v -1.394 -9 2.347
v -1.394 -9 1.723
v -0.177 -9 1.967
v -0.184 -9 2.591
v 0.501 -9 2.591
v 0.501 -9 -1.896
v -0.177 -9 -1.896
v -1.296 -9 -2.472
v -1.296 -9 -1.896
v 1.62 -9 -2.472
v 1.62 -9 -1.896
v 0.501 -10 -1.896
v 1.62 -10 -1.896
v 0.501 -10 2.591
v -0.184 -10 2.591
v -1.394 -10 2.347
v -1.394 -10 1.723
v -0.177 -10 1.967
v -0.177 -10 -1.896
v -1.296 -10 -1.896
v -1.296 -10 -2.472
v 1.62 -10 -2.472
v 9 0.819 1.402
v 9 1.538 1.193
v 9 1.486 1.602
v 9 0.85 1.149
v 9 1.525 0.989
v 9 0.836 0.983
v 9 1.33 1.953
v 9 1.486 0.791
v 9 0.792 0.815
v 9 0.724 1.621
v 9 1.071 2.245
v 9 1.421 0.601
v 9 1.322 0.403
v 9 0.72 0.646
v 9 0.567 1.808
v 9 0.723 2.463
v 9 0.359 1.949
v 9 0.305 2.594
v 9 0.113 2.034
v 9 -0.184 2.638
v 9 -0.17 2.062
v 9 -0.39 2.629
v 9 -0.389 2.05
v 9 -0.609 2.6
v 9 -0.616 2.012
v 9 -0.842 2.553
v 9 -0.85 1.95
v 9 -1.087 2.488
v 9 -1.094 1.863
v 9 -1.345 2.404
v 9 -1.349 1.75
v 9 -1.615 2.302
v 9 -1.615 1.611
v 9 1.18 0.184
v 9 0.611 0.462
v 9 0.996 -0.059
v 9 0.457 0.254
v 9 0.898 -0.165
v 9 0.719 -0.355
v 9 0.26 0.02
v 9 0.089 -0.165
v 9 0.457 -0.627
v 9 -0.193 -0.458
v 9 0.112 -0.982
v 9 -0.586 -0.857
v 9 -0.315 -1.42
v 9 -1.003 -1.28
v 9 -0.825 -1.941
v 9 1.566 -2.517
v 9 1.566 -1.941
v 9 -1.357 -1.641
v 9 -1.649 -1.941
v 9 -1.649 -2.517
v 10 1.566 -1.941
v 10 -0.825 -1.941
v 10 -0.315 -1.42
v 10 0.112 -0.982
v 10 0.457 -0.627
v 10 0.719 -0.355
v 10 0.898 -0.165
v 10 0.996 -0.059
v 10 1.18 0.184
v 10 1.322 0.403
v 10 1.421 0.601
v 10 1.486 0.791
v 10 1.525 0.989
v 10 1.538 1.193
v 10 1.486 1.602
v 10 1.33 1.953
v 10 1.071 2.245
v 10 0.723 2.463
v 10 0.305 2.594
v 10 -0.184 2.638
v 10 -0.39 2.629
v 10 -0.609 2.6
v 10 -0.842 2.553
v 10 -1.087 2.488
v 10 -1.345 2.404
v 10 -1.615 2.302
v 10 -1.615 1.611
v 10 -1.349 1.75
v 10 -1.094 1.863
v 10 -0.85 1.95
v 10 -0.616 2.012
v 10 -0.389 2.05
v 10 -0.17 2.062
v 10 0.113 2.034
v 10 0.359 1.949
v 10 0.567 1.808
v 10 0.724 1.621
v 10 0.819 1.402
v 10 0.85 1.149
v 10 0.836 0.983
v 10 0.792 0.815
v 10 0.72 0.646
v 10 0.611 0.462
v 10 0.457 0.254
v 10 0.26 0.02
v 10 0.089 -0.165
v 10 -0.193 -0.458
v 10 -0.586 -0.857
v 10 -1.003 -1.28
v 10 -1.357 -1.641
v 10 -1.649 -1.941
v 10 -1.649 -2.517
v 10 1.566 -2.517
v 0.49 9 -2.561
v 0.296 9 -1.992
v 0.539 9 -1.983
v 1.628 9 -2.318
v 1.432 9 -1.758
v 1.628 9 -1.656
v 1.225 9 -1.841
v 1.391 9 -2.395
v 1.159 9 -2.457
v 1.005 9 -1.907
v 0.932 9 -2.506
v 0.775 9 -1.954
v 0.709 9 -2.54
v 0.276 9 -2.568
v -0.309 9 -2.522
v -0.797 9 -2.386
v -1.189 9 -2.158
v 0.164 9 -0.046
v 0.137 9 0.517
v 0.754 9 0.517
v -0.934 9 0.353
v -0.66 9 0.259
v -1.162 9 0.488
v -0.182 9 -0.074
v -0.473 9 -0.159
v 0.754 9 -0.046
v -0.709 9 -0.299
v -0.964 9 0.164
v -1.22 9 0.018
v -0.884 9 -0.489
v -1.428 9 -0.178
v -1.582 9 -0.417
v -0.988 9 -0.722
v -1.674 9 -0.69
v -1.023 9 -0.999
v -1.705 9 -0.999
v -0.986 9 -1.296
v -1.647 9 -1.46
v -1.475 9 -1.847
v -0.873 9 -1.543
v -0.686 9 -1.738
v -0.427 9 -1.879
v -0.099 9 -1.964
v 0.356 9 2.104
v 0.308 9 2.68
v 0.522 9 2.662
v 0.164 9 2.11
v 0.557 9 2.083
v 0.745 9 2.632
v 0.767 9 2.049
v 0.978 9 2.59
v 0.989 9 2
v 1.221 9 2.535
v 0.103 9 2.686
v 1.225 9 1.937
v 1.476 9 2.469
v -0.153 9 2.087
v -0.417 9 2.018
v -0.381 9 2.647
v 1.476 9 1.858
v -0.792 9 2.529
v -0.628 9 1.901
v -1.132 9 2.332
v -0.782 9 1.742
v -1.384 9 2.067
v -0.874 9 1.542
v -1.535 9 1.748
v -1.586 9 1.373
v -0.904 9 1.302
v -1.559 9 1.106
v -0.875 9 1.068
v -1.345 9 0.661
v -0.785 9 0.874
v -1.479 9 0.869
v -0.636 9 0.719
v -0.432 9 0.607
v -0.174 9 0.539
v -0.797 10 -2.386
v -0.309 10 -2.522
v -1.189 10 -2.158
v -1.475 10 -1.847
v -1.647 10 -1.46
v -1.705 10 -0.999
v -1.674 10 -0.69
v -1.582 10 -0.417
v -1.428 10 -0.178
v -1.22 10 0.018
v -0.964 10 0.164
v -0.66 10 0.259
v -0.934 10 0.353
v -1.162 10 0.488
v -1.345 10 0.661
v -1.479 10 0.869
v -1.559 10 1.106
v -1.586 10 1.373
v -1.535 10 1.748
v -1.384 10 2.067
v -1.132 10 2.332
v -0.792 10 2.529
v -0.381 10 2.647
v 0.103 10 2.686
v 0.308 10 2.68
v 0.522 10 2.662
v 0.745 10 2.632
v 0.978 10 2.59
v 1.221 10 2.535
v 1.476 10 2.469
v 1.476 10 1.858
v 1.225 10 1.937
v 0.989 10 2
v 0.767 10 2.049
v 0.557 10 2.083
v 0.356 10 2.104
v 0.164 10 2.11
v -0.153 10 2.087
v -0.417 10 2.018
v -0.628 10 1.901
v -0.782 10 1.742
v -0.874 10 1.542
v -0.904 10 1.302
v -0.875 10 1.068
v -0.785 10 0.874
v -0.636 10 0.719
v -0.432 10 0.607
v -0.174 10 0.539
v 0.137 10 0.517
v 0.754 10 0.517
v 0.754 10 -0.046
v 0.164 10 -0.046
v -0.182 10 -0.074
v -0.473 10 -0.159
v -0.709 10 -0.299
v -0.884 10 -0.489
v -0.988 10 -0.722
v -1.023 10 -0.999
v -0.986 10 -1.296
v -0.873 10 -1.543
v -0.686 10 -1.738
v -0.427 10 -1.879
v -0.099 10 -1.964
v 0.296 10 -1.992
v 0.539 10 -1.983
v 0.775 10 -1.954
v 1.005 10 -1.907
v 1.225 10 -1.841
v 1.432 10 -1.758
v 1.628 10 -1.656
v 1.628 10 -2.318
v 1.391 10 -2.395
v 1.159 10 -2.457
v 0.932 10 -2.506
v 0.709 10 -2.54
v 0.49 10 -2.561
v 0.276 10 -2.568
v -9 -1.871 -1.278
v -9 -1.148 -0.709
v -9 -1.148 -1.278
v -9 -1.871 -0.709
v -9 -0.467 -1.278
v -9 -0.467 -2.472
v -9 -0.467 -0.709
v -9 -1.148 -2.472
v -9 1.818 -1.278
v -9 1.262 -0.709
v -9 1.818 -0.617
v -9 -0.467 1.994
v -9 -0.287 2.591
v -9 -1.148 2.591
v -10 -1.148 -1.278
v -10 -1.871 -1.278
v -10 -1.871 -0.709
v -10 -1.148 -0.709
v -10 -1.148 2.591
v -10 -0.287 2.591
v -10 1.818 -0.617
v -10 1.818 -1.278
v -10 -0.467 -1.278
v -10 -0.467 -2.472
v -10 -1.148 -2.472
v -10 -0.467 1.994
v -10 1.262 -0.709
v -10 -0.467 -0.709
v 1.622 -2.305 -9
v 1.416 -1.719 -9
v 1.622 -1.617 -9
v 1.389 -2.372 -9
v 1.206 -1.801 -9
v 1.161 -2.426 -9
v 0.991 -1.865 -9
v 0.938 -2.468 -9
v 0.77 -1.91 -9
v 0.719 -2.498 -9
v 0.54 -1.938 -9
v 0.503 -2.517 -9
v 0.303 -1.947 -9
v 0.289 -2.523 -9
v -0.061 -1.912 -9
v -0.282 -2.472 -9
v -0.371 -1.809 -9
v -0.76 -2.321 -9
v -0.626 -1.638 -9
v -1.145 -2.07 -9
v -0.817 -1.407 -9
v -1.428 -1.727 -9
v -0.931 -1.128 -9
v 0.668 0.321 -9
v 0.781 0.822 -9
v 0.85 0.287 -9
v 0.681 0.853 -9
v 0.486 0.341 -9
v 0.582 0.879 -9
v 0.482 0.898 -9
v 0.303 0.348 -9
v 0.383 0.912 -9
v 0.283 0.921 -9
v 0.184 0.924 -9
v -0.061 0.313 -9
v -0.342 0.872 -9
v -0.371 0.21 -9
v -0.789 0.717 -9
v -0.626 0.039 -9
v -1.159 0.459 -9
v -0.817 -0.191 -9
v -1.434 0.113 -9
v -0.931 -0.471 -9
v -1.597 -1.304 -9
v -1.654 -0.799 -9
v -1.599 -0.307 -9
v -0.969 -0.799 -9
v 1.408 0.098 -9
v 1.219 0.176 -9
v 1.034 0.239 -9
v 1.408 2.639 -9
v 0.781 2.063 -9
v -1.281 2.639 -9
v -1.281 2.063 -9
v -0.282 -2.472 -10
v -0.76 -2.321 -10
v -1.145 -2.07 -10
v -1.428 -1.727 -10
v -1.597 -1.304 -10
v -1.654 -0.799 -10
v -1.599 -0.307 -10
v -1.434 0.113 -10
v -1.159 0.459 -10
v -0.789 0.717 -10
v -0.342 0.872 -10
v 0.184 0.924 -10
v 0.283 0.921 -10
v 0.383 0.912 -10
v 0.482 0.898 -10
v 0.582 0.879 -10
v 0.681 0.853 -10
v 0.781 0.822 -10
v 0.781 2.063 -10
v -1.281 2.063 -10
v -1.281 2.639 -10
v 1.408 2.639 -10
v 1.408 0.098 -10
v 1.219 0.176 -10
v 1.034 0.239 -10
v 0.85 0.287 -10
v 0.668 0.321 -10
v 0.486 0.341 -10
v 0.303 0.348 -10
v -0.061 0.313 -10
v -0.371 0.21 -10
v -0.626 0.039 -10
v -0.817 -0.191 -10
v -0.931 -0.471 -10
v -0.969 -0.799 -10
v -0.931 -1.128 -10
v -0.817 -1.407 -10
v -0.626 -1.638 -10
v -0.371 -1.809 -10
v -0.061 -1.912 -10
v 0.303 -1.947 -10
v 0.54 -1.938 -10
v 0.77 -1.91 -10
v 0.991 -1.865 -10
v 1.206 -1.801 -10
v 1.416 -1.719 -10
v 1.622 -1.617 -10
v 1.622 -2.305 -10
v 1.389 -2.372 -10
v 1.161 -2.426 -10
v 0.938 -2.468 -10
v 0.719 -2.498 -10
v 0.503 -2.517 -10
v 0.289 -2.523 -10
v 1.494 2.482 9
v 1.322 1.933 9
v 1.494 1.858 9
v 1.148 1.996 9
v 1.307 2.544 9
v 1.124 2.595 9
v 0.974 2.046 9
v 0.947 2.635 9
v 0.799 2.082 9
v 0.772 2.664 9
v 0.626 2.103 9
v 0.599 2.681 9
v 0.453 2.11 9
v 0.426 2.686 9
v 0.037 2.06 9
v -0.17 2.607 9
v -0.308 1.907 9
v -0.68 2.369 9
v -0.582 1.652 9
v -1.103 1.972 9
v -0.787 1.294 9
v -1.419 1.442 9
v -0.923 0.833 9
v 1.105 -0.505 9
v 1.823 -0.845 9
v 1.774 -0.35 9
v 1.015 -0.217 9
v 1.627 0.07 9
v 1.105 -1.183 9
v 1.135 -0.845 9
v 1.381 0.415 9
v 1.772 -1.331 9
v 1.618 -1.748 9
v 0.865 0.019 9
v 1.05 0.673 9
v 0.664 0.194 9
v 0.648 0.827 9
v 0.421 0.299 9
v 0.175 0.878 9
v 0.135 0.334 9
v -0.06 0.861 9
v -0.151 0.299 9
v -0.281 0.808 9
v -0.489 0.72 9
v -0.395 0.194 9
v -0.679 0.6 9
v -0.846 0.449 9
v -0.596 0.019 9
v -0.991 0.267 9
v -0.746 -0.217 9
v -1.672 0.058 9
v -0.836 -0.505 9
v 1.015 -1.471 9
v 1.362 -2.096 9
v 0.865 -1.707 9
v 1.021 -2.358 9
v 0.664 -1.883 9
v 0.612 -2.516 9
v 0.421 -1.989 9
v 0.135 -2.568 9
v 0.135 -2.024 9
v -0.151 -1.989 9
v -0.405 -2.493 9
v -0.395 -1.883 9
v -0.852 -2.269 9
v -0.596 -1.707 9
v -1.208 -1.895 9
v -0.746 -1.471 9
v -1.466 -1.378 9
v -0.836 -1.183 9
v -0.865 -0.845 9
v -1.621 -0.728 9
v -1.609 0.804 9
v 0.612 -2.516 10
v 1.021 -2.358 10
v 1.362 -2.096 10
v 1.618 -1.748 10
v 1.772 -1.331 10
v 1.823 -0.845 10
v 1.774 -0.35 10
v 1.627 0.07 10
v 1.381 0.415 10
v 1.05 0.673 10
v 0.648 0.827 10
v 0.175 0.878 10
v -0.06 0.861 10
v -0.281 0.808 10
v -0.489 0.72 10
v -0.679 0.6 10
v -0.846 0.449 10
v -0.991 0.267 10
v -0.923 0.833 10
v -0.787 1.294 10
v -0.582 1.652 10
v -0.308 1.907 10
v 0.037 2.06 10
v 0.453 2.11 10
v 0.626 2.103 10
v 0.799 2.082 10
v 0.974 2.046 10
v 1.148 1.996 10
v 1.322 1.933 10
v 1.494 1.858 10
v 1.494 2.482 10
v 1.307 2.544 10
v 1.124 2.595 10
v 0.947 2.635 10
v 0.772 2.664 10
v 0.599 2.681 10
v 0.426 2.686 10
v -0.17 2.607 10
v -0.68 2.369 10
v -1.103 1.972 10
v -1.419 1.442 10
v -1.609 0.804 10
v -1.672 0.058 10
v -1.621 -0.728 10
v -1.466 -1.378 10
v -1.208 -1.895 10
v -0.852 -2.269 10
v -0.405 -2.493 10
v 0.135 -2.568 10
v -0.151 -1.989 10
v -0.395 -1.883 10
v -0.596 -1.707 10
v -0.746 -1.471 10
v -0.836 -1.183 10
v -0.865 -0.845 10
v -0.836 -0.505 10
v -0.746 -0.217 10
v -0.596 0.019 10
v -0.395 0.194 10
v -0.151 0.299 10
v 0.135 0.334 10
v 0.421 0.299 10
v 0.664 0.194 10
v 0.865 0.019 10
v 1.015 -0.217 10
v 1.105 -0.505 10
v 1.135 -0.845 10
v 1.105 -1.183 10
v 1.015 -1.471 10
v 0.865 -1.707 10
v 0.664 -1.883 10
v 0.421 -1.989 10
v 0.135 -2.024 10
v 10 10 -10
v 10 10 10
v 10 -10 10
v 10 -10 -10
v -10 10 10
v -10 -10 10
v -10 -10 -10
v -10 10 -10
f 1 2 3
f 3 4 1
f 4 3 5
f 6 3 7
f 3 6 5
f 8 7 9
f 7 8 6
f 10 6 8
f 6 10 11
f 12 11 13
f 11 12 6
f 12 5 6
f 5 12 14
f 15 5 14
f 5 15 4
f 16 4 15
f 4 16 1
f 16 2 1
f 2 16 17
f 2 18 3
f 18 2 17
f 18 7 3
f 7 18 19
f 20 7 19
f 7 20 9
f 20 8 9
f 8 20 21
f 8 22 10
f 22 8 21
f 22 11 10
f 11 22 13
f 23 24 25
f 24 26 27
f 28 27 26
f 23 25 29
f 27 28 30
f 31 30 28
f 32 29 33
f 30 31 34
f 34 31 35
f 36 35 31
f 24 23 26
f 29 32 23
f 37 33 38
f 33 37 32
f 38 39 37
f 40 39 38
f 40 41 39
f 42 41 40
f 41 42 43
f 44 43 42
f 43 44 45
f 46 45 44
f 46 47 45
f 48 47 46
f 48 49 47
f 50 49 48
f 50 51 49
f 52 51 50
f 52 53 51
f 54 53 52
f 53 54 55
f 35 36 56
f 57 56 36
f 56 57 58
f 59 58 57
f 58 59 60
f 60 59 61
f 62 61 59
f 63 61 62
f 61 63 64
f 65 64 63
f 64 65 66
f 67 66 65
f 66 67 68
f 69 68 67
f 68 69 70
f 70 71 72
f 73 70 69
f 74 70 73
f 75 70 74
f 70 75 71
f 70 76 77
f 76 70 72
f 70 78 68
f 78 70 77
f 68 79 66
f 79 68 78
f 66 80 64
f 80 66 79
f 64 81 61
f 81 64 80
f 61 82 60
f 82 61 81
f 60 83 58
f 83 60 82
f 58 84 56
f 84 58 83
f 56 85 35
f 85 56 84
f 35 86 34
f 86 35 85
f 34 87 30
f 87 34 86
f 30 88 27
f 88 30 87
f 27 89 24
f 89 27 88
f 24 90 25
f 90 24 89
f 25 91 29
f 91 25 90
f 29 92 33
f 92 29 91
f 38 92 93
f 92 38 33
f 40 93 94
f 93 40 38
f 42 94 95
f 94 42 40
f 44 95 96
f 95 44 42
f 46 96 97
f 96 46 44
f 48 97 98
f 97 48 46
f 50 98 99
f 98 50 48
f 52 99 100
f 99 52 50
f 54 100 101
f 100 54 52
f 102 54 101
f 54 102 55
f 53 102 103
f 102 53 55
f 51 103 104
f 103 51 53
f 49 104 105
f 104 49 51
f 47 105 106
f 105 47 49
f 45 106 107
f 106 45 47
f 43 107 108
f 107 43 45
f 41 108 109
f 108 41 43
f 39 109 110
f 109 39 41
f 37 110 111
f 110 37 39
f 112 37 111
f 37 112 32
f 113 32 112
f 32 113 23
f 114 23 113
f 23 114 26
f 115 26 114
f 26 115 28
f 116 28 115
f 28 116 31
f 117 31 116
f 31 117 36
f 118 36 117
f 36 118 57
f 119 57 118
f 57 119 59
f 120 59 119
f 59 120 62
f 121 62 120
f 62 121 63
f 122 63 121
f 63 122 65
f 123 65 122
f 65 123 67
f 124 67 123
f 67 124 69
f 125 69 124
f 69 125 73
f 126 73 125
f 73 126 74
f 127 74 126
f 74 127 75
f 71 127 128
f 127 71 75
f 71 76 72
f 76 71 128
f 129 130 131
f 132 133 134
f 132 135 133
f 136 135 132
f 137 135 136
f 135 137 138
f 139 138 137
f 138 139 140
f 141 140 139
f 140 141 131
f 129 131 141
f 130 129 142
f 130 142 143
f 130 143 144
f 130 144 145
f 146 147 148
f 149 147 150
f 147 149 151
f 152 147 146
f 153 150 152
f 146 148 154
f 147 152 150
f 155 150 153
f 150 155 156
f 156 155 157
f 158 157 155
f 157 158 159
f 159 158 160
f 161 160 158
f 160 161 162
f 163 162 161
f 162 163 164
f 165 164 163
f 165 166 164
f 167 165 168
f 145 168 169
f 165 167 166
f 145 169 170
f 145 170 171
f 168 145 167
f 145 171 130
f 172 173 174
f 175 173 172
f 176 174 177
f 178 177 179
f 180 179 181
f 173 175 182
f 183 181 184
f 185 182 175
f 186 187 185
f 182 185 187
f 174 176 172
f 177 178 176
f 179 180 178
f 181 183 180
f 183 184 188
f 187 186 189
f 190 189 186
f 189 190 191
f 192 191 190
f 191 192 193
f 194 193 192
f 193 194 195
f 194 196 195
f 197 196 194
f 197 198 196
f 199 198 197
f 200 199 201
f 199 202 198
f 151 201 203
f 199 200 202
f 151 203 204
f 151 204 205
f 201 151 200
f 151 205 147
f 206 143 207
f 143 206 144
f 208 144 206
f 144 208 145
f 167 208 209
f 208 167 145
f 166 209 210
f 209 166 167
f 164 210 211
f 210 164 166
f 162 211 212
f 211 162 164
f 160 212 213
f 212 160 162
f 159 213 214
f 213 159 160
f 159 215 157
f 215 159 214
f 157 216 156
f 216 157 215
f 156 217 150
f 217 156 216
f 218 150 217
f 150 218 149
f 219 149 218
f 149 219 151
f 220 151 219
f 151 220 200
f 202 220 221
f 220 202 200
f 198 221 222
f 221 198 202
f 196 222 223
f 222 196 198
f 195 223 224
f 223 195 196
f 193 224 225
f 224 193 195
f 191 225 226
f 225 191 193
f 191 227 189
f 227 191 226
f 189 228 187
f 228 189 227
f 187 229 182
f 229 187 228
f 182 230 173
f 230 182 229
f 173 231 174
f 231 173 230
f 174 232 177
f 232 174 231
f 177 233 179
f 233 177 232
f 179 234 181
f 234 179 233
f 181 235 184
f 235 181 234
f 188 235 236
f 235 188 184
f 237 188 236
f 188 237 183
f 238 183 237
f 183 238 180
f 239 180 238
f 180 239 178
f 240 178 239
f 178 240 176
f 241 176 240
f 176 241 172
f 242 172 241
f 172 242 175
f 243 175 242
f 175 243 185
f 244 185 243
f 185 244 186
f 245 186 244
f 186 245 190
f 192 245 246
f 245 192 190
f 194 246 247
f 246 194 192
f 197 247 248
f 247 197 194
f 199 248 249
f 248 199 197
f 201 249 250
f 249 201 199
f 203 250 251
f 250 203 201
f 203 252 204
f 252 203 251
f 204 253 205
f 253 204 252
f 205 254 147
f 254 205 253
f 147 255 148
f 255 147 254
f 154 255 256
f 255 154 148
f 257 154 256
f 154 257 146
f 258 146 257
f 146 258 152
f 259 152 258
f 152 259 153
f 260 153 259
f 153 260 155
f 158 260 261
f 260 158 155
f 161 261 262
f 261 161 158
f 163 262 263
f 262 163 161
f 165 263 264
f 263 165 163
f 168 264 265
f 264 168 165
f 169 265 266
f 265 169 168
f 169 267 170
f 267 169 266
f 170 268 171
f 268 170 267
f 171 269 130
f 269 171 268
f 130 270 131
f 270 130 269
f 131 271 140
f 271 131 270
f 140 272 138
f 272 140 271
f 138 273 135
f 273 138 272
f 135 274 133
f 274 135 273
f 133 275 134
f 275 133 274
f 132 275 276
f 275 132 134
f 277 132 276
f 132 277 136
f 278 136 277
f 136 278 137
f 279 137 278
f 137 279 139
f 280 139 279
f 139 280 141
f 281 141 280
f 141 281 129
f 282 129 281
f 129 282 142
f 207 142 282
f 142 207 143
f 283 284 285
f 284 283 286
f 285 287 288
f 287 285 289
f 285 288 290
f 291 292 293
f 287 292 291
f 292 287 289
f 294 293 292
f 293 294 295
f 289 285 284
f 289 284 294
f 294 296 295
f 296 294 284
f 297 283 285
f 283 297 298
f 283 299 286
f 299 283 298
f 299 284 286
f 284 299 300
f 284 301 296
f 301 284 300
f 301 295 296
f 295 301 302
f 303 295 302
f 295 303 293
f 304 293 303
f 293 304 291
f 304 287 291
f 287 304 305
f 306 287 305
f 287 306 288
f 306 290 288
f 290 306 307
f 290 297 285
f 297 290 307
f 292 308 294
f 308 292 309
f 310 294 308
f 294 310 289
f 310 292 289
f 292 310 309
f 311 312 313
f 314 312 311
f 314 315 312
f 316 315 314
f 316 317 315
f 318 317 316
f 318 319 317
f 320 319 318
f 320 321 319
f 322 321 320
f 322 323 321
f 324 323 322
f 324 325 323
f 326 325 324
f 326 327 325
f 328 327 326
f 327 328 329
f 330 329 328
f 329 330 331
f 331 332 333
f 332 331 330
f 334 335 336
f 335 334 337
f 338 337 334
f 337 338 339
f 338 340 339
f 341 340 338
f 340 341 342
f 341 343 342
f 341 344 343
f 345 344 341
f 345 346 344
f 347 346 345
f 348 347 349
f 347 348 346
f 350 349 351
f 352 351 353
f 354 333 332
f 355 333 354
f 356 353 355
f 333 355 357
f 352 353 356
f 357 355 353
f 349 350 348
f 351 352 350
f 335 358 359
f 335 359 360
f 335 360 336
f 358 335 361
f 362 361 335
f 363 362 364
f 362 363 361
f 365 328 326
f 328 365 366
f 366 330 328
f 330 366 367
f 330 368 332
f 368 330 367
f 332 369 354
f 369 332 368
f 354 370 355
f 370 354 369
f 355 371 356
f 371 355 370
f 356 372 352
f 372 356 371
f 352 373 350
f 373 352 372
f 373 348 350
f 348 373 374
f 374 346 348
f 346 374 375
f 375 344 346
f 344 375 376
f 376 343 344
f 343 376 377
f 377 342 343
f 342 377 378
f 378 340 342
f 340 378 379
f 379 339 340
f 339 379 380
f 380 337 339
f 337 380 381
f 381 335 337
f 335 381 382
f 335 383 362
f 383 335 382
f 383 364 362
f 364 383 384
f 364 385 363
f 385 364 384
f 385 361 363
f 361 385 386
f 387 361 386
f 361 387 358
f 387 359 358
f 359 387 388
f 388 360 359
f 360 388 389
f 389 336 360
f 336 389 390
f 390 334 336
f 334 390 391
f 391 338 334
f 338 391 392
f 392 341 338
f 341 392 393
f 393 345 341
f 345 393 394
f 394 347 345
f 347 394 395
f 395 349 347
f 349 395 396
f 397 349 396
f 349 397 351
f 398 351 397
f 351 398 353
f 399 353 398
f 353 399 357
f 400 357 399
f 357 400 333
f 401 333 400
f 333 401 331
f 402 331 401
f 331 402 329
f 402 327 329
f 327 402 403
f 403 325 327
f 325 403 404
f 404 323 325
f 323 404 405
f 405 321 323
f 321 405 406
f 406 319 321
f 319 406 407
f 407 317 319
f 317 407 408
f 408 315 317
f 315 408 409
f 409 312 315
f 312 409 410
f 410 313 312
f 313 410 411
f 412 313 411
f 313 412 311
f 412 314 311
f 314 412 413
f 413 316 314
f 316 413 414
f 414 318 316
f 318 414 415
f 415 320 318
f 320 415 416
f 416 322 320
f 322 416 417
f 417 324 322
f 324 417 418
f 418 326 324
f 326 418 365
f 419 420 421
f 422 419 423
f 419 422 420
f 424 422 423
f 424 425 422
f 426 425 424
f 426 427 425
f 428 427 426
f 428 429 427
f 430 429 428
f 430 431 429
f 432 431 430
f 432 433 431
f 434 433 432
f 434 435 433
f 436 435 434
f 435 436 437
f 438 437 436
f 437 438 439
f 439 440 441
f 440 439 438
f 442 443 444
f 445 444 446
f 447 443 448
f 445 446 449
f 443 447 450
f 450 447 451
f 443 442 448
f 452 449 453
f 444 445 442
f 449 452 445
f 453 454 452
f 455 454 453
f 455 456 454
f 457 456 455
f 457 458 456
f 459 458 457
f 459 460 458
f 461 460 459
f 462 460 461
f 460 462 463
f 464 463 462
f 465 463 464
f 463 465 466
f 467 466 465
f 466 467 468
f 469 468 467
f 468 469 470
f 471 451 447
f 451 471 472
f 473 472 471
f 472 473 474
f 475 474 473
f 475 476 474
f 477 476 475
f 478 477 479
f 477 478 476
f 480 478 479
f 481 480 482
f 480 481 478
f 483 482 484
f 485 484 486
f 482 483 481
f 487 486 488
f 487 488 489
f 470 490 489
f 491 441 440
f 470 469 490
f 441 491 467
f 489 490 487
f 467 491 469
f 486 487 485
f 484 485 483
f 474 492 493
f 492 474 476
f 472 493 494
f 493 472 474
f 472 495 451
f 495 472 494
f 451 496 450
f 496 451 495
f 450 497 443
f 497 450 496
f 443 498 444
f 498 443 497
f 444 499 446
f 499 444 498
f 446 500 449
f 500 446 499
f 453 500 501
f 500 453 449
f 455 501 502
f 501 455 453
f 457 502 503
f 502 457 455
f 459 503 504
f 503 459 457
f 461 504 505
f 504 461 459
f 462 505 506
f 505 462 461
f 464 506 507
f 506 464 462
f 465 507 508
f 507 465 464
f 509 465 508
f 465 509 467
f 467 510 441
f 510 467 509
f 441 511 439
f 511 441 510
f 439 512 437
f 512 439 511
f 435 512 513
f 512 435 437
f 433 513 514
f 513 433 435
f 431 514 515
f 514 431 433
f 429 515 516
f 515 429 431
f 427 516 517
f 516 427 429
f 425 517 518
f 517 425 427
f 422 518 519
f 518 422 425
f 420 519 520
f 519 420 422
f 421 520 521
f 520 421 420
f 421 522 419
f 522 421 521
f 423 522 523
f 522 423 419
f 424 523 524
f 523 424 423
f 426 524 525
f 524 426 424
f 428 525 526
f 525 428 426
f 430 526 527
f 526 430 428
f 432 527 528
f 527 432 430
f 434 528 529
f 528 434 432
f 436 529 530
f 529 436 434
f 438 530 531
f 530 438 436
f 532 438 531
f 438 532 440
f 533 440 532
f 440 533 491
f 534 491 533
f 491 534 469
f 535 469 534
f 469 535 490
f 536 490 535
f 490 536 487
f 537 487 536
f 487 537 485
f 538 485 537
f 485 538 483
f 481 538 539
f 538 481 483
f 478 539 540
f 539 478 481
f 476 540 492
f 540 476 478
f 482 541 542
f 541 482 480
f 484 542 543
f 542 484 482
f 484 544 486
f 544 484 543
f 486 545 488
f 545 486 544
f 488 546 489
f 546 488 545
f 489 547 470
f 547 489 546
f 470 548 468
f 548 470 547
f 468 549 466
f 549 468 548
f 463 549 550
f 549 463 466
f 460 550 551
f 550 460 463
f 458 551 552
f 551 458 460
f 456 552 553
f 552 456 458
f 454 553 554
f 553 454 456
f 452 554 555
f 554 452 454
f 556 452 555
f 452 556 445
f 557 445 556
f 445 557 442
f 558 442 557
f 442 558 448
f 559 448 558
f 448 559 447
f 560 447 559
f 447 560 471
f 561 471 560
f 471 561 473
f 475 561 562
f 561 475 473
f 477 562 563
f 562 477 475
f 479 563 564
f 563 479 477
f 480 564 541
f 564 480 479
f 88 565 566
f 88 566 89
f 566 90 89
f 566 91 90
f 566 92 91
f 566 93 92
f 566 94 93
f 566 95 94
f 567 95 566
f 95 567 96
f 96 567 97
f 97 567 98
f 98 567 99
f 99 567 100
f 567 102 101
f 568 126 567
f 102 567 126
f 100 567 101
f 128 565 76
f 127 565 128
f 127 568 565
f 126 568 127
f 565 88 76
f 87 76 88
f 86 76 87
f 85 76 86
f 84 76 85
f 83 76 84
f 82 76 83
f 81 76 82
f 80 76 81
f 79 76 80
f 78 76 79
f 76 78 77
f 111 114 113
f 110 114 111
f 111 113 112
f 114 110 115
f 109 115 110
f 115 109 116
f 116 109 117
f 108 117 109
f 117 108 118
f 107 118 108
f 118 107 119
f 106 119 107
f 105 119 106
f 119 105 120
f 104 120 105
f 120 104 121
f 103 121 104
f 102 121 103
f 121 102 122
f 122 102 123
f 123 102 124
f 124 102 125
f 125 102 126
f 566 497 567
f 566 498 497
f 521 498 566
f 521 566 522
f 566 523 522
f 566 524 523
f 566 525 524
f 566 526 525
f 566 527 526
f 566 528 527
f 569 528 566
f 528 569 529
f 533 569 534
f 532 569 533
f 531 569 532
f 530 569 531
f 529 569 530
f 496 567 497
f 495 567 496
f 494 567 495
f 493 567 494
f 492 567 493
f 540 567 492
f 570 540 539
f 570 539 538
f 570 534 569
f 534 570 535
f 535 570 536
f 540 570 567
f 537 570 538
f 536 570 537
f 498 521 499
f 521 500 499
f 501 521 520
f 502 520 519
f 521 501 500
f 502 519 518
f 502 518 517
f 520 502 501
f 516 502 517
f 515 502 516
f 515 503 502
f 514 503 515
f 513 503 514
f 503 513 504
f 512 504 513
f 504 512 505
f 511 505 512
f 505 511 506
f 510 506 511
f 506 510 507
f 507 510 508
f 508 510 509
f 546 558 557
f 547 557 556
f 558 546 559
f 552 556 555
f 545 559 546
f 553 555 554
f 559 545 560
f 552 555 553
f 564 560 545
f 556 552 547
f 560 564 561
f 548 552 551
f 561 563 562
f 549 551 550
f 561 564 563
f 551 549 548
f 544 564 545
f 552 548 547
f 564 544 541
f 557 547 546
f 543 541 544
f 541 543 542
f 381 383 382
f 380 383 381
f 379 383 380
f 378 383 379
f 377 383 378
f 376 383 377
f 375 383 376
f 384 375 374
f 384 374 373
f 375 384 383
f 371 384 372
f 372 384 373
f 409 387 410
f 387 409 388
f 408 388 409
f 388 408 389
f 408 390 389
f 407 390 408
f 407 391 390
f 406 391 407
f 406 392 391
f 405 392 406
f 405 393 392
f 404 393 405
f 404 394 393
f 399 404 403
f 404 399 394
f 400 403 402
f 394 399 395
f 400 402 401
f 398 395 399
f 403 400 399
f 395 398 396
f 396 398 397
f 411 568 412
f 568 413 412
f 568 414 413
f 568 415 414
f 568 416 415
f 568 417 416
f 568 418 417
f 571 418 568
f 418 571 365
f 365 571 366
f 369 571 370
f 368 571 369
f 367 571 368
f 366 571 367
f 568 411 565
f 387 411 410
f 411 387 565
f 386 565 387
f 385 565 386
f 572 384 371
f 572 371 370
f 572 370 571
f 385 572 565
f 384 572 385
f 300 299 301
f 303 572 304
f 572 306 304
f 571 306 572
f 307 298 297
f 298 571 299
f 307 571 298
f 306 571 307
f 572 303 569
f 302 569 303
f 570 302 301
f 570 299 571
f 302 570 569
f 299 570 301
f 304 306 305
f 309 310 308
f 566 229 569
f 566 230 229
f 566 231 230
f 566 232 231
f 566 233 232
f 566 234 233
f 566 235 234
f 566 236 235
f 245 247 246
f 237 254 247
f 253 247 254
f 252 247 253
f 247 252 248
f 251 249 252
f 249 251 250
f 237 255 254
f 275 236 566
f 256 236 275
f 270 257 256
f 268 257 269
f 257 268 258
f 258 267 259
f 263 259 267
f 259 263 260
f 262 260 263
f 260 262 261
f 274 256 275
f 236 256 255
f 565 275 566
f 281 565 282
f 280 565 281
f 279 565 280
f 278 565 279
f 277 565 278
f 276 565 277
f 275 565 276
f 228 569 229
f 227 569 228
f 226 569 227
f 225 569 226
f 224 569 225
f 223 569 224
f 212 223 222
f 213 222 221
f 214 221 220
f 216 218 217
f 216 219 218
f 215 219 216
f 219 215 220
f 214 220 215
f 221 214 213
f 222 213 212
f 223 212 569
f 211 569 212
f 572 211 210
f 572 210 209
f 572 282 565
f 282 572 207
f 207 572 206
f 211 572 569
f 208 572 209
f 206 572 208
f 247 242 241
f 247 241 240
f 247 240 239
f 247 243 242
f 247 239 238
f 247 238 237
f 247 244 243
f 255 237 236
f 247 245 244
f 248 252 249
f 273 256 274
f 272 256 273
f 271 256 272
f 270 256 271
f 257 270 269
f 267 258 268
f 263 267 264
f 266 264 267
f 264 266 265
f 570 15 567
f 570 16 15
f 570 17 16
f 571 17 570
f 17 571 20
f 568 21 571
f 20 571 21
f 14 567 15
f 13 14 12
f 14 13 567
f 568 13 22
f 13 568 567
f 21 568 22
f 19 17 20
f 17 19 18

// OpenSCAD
cube_side = 20;
letter_depth = 2;



module print_symb(l){
        linear_extrude(letter_depth){
                text(l, 5, "3270 Nerdfont", halign="center", valign = "center");
        }
}

color("#444444")
difference(){
    cube([cube_side,cube_side,cube_side],center=true);
    
    numbers = "123456";
    
    for(i = [0:1:3])    
        rotate([90,0,90*i])
        translate([0,0,cube_side/2-letter_depth/2])
        print_symb(numbers[i]);
    for(i = [0:1:1])    
        rotate([0,90+180*i,0])
        translate([cube_side/2-letter_depth/2,0,0])
        rotate([0,90,0*i])
        print_symb(numbers[4+i]);
}
    
